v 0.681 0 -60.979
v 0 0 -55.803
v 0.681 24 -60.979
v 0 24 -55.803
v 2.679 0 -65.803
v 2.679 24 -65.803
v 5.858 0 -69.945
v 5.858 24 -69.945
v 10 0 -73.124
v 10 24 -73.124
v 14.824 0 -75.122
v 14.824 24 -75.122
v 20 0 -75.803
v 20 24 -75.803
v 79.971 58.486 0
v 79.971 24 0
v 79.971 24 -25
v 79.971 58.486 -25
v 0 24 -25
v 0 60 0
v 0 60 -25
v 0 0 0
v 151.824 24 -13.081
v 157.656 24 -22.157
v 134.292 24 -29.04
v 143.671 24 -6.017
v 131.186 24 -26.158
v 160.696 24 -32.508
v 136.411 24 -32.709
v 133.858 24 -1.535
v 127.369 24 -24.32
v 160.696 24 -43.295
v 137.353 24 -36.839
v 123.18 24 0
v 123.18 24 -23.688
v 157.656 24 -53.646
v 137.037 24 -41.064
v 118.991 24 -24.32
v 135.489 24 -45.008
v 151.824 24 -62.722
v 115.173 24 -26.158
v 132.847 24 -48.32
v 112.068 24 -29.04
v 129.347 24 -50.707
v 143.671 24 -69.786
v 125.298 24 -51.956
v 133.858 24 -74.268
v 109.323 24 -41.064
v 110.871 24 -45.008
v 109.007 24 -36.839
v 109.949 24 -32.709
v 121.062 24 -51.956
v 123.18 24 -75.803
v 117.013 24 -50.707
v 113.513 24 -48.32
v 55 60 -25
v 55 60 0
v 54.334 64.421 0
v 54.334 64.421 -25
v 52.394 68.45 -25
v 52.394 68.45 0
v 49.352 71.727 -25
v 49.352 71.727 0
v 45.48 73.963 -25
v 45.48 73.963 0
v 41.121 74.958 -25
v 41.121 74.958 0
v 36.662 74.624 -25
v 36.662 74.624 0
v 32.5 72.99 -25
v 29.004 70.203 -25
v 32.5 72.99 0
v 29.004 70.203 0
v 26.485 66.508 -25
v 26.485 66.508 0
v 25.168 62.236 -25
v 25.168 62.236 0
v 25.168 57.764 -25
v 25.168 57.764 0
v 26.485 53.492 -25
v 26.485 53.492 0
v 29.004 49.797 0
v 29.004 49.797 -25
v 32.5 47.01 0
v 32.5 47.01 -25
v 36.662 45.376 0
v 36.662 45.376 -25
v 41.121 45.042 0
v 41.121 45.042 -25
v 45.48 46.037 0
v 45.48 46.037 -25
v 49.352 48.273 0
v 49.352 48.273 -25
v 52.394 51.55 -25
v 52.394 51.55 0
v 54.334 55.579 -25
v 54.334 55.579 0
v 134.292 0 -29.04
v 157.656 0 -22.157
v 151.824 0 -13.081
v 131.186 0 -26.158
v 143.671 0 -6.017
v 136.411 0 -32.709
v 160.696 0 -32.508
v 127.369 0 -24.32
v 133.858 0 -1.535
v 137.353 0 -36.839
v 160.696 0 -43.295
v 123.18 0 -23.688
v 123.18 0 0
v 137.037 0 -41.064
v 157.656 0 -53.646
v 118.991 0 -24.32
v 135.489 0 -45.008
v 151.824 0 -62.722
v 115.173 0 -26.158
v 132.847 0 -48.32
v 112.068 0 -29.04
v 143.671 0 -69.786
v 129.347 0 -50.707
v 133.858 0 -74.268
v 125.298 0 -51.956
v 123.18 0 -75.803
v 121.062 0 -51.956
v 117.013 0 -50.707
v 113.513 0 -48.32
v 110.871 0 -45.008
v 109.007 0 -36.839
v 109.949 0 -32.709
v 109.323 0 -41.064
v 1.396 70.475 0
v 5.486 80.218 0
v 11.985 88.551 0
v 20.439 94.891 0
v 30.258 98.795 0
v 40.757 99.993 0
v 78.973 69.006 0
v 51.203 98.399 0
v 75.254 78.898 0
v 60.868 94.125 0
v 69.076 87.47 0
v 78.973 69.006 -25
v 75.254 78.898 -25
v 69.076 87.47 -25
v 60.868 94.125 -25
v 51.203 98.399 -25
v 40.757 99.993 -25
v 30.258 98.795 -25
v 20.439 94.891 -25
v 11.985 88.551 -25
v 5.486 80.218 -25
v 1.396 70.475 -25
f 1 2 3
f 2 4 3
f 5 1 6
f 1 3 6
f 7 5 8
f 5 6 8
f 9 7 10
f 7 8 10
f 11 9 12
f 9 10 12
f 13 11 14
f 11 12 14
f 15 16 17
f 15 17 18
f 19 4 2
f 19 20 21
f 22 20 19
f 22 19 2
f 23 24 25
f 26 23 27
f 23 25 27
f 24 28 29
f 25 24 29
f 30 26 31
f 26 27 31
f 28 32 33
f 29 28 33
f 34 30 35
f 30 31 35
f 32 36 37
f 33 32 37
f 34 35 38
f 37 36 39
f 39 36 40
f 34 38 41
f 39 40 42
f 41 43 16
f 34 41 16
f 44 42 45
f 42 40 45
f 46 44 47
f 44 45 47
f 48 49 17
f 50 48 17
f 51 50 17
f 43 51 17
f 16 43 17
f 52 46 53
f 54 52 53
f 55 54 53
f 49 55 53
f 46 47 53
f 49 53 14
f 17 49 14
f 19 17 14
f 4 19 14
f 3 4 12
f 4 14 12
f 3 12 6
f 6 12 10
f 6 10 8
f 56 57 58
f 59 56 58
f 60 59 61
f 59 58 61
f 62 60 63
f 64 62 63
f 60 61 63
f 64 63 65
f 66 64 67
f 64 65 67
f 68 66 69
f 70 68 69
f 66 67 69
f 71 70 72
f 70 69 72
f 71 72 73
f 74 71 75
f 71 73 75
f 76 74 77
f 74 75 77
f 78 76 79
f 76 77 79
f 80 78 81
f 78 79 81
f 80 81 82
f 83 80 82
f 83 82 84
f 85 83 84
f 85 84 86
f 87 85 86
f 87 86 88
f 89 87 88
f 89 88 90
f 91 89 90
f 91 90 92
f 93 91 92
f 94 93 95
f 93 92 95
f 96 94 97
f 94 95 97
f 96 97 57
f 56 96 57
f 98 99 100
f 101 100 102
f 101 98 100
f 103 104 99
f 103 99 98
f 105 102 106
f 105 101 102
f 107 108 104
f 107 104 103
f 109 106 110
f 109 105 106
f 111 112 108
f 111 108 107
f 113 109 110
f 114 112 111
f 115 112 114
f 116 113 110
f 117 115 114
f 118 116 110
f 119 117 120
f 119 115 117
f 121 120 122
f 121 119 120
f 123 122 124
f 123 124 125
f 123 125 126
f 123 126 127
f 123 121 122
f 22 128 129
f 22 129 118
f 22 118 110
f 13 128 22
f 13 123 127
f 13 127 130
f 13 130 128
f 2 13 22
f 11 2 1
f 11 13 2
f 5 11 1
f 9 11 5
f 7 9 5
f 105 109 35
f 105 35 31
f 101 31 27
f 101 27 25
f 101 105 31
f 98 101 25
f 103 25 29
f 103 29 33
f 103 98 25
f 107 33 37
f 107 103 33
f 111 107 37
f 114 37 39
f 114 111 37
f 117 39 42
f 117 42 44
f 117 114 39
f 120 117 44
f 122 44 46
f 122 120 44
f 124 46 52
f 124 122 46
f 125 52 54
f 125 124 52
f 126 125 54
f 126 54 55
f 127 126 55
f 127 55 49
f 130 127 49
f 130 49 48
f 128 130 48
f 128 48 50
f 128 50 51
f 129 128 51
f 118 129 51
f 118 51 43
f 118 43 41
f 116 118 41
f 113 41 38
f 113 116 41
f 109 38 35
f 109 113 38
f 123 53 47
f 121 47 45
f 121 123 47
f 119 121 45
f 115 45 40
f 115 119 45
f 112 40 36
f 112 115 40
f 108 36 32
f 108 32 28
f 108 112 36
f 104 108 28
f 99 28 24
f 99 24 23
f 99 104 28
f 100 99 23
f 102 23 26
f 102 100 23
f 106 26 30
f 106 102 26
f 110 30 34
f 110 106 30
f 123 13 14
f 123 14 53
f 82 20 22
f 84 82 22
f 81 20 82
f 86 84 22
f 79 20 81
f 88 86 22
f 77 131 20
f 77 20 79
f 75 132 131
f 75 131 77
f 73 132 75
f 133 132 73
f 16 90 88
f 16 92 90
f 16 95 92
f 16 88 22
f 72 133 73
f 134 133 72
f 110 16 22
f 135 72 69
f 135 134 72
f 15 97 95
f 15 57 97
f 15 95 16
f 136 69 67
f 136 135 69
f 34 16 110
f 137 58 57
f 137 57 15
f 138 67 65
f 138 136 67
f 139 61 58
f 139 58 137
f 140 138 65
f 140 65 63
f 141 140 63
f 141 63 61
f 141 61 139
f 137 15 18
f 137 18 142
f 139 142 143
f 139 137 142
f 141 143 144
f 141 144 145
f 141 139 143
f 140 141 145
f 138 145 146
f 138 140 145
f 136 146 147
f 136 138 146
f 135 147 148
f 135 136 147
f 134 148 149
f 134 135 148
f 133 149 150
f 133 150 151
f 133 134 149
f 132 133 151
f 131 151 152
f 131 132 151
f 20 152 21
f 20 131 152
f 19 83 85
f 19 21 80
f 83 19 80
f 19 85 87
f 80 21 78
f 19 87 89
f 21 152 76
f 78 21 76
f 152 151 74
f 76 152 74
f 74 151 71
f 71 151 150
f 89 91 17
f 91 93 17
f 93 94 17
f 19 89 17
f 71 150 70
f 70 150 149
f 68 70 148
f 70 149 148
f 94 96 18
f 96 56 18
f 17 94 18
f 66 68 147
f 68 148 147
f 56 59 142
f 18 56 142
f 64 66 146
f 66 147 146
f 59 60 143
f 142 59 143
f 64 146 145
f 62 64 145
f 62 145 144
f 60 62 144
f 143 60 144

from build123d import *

# Parameters (mm, degrees)
SKETCH2_R           = 14.213072664
BOSS_EXTRUDE2_DEPTH = 24
SKETCH4_R           = 15
BOSS_EXTRUDE4_DEPTH = 25
FILLET2_R           = 20


with BuildPart() as part:
    # Sketch2 → Boss-Extrude2 (new body)
    with BuildSketch(Plane(origin=(0, 0, 0), x_dir=(1, 0, 0), z_dir=(0, 1, 0))):
        with BuildLine():
            Line((0, 0), (0, 75.803054209))
            Line((0, 75.803054209), (123.17996309, 75.803054209))
            ThreePointArc((123.17996309, 75.803054209), (161.081490195, 37.901527105), (123.17996309, 0))
            Line((123.17996309, 0), (0, 0))
        make_face()
        with Locations(Location((123.17996309, 37.901527105, 0), (0, 0, 270))):
            Circle(SKETCH2_R, mode=Mode.SUBTRACT)
    extrude(amount=BOSS_EXTRUDE2_DEPTH)

    # Sketch4 → Boss-Extrude4 (add)
    with BuildSketch(Plane.XY):
        with BuildLine():
            Line((0, 60), (0, 24))
            Line((0, 24), (79.971353362, 24))
            Line((79.971353362, 24), (79.971353362, 58.486424634))
            ThreePointArc((79.971353362, 58.486424634), (40.756923216, 99.992837699), (0, 60))
        make_face()
        with Locations((40, 60)):
            Circle(SKETCH4_R, mode=Mode.SUBTRACT)
    extrude(amount=-BOSS_EXTRUDE4_DEPTH)

    # Fillet2
    fillet2_edges = [part.edges().sort_by_distance(p)[0] for p in [
        (0, 12, -75.803054209),
    ]]
    fillet(fillet2_edges, radius=FILLET2_R)


solid = part.part
